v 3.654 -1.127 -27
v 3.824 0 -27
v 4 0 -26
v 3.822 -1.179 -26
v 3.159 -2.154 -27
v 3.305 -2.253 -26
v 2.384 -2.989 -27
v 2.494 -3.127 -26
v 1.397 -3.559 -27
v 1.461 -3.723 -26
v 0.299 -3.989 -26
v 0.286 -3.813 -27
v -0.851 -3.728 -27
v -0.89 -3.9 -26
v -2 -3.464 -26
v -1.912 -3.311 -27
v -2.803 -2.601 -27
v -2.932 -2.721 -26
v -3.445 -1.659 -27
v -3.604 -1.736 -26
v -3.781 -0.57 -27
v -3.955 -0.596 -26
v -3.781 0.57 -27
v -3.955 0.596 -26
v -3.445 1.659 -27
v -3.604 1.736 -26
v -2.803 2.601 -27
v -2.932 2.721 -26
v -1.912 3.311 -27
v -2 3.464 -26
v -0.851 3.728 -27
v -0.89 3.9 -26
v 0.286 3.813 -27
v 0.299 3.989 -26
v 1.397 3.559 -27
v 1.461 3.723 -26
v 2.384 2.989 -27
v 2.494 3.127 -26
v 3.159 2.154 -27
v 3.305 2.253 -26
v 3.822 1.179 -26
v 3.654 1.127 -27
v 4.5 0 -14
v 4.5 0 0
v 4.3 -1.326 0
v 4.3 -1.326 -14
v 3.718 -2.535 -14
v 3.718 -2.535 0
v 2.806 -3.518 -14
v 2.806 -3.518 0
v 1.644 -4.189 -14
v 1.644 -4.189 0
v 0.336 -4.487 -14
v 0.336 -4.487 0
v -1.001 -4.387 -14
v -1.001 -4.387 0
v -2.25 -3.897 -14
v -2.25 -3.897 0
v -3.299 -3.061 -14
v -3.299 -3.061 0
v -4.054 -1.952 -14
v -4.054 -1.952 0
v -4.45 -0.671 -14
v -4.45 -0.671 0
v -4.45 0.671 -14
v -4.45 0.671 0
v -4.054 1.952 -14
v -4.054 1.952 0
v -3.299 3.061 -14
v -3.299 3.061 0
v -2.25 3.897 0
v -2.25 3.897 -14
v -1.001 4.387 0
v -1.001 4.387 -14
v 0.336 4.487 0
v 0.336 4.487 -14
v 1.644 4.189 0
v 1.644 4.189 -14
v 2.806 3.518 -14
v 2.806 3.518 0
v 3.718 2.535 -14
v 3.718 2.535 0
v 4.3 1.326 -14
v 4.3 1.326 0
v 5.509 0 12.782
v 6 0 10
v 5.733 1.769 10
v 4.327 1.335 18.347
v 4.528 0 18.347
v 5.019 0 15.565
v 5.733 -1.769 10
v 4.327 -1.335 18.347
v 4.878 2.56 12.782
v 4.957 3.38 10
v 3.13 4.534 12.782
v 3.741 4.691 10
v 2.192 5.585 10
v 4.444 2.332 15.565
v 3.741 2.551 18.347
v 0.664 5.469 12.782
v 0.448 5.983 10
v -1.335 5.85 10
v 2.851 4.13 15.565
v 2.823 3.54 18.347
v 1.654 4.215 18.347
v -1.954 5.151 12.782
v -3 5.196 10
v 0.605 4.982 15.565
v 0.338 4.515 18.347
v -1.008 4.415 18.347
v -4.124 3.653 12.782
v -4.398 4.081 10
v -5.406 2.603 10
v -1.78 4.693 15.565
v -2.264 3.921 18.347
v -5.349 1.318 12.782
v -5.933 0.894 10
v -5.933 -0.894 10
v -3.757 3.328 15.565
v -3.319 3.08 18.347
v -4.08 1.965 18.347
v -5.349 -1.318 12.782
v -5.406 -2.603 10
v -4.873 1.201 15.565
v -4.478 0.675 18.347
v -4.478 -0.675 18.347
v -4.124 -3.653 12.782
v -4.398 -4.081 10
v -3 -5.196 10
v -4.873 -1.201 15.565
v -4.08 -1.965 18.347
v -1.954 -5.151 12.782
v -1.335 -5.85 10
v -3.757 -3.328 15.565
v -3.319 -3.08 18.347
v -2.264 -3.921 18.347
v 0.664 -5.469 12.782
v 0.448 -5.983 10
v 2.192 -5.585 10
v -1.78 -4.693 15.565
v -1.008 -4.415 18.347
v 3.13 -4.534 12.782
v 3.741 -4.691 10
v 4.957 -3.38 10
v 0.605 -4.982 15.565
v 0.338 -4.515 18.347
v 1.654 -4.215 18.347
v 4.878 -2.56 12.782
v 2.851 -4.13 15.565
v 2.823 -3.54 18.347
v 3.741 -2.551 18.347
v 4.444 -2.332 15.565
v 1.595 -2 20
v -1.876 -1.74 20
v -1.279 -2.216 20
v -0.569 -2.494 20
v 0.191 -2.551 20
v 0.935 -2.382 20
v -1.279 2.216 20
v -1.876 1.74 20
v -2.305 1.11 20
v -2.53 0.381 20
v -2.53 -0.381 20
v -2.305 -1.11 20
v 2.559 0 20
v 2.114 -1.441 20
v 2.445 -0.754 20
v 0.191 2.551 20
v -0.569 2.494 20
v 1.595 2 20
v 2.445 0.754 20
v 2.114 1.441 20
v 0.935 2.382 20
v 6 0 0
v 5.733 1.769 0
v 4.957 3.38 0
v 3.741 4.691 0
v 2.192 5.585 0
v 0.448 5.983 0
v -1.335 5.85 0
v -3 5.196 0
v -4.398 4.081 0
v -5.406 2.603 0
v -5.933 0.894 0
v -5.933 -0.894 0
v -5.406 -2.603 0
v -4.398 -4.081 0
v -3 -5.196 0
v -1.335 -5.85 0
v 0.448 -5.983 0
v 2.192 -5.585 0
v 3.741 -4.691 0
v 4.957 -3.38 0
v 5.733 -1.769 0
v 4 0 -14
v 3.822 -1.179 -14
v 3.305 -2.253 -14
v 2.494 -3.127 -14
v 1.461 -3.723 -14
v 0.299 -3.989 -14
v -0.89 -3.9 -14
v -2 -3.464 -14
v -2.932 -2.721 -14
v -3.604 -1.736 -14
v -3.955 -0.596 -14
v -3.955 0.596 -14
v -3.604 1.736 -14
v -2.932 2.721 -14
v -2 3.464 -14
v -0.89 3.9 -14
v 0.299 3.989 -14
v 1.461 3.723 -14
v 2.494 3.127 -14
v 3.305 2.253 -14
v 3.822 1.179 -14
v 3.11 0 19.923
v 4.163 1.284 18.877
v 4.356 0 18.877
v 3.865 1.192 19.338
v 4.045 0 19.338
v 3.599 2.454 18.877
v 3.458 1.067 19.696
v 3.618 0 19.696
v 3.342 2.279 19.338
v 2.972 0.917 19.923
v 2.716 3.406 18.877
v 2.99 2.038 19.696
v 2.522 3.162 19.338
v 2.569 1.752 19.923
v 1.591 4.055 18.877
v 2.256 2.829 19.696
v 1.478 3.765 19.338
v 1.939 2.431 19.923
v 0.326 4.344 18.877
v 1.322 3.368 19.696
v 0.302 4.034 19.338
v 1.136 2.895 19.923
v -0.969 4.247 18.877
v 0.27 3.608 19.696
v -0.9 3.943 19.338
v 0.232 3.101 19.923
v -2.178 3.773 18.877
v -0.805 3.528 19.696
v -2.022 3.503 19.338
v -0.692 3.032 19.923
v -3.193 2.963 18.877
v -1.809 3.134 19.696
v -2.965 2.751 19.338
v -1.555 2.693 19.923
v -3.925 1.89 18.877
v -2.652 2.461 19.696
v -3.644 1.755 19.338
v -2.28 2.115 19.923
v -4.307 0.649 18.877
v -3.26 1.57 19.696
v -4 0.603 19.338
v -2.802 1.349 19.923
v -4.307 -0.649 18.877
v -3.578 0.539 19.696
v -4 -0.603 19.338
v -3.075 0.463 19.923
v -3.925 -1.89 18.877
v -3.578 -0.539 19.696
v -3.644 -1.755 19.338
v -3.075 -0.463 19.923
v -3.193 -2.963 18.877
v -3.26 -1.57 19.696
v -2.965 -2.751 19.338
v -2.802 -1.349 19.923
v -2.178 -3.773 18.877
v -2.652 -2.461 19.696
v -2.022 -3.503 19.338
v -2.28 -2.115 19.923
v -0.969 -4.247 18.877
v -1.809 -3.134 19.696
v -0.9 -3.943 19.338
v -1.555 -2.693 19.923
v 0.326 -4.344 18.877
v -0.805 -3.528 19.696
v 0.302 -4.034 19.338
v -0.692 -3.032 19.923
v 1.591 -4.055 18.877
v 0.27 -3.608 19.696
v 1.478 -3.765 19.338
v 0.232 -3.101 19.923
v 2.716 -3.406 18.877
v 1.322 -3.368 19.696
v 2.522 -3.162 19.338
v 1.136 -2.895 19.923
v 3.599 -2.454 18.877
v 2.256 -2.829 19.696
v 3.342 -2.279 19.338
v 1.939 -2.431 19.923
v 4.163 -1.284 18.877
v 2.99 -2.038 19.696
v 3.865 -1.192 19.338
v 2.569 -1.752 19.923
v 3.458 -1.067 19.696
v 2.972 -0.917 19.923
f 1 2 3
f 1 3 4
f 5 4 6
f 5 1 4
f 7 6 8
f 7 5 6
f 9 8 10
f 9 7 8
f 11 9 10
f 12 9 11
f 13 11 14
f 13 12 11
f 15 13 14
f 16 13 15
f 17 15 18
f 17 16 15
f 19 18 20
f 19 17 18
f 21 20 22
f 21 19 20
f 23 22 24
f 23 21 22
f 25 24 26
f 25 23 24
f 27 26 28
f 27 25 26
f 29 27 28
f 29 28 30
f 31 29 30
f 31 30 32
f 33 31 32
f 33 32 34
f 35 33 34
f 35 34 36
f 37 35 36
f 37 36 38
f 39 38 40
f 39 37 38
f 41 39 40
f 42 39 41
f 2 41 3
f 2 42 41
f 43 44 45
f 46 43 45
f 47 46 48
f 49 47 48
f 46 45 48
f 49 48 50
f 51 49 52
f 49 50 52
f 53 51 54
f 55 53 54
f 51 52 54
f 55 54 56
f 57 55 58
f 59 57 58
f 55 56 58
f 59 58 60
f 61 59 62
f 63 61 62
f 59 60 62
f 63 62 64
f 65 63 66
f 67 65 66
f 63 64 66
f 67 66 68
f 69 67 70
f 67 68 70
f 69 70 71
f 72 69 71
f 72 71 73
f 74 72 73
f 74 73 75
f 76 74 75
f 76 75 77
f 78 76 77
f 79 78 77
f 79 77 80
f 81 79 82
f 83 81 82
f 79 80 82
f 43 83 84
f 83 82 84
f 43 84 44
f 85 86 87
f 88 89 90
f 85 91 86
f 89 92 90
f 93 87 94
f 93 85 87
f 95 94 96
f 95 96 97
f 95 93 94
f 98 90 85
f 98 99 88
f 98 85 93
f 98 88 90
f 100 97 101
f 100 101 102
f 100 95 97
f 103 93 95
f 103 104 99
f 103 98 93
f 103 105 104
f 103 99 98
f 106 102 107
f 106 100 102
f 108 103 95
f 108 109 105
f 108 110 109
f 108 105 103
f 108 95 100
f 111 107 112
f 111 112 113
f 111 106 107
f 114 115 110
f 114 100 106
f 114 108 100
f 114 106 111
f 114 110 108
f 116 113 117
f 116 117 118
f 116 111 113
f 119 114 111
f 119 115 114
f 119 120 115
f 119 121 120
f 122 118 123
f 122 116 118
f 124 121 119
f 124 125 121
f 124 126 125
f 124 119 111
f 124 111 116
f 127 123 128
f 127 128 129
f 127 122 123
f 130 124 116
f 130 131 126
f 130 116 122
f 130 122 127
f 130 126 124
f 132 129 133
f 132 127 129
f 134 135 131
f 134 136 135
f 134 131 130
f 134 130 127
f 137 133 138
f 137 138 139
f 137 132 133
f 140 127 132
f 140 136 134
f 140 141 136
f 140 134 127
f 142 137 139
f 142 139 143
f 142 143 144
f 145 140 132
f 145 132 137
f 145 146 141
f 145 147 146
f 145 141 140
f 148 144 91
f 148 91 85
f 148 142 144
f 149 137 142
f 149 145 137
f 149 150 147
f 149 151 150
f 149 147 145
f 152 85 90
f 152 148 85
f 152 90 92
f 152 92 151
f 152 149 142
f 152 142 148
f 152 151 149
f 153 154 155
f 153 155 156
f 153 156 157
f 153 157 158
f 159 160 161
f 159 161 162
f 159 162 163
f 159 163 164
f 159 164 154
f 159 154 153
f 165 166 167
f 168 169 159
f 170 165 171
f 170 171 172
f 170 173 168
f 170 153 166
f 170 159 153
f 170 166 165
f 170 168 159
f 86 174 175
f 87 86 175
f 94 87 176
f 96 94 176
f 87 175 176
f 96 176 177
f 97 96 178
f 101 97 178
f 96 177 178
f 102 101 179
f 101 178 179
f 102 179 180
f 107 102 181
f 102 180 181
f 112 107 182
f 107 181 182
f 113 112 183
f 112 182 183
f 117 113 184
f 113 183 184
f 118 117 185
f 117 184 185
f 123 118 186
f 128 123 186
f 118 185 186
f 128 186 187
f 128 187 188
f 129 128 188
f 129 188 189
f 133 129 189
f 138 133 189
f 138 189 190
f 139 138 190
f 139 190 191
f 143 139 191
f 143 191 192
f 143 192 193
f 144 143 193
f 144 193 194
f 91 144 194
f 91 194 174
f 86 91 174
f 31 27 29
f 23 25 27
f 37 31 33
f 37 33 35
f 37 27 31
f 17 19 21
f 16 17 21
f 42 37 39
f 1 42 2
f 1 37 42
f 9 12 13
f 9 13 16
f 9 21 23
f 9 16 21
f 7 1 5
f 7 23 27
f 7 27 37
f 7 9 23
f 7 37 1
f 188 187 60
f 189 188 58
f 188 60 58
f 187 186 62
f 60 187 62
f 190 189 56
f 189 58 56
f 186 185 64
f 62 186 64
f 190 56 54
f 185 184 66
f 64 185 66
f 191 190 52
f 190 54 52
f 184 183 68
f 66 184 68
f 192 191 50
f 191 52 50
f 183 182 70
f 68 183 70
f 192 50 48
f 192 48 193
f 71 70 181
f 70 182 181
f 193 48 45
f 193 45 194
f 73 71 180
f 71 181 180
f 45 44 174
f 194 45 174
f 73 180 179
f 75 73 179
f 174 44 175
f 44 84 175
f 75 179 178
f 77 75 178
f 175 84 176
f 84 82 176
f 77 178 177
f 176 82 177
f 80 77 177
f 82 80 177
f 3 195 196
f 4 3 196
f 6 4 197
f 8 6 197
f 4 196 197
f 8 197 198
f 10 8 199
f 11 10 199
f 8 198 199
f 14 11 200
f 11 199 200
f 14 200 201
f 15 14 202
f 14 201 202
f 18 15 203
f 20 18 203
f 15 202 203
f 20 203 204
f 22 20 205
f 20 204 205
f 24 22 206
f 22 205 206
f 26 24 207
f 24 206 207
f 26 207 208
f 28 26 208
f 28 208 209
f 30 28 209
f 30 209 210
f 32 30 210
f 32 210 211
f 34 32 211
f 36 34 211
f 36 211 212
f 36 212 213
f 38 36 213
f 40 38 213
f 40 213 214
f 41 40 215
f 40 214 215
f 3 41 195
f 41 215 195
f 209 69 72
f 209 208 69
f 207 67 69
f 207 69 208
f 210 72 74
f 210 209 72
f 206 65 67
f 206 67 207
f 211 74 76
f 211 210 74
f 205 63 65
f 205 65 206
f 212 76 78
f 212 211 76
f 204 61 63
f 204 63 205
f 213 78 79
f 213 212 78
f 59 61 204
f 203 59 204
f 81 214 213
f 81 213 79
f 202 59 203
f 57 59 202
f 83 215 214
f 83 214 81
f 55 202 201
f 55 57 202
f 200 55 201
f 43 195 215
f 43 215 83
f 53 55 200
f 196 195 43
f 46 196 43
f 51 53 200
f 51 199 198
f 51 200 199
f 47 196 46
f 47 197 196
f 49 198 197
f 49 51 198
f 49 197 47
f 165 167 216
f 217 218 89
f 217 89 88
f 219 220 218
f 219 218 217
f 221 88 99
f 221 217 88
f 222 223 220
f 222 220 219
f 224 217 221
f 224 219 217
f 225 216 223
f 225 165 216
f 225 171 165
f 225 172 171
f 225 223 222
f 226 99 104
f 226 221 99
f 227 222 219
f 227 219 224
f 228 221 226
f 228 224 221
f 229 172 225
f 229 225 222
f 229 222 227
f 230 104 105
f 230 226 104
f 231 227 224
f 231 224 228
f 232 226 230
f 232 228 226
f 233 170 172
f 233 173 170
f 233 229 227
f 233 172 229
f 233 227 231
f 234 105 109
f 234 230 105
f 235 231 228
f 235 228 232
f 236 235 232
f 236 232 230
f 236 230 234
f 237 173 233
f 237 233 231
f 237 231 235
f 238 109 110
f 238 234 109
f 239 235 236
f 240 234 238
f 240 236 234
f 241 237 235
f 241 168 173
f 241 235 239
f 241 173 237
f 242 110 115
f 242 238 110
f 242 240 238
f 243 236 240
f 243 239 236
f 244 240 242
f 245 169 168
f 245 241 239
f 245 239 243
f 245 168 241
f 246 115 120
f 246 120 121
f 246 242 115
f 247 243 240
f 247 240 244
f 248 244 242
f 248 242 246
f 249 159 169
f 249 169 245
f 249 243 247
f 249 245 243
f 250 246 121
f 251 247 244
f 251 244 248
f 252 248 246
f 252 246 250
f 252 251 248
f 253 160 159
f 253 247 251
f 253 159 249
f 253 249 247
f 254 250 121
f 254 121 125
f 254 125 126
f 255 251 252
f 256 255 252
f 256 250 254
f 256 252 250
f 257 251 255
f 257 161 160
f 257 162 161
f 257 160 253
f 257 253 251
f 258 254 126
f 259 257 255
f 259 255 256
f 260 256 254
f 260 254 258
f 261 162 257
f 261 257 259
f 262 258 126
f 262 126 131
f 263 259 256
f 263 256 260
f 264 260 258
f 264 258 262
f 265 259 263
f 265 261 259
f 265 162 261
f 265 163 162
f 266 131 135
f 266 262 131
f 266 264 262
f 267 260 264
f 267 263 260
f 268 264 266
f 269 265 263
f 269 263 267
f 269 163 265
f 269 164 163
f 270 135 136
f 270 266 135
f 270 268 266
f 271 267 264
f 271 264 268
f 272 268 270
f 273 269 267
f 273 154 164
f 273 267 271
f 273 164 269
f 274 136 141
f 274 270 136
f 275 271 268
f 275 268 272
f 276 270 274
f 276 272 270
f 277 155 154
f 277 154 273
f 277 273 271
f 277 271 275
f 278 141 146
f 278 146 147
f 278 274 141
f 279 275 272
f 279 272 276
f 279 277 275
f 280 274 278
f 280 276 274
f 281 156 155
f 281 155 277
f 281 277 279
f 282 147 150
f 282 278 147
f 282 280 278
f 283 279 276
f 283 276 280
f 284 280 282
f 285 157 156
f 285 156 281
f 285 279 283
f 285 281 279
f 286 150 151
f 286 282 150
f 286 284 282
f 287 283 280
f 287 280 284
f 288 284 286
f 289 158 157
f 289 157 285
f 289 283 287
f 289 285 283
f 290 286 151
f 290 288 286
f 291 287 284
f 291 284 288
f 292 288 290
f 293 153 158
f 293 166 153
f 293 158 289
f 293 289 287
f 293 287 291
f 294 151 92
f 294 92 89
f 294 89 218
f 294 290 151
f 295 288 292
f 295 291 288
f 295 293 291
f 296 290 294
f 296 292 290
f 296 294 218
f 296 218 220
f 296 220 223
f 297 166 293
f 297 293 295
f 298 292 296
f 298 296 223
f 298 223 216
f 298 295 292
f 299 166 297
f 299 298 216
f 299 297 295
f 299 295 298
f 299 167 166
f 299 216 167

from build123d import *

# Parameters (mm, degrees)
CROQUIS1_R              = 6
SALIENTE_EXTRUIR1_DEPTH = 10
CROQUIS2_R              = 6
SALIENTE_EXTRUIR2_DEPTH = 10
CHAFL_N1_SIZE           = 10
CHAFL_N1_SIZE2          = 1.763269807
REDONDEO1_R             = 2
CROQUIS3_R              = 4.5
SALIENTE_EXTRUIR3_DEPTH = 14
CROQUIS4_R              = 4
SALIENTE_EXTRUIR4_DEPTH = 13
CHAFL_N2_SIZE           = 1
CHAFL_N2_SIZE2          = 0.176326981


with BuildPart() as part:
    # Croquis1 → Saliente-Extruir1 (new body)
    with BuildSketch(Plane.XY):
        Circle(CROQUIS1_R)
    extrude(amount=SALIENTE_EXTRUIR1_DEPTH)

    # Croquis2 → Saliente-Extruir2 (add)
    with BuildSketch(Plane.XY.offset(10)):
        Circle(CROQUIS2_R)
    extrude(amount=SALIENTE_EXTRUIR2_DEPTH)

    # Chaflán1
    chafl_n1_edges = [part.edges().sort_by_distance(p)[0] for p in [
        (-6, 0, 20),
    ]]
    chafl_n1_side = [part.faces().sort_by_distance(p)[0] for p in [
        (-6, 0, 10),
    ]]
    chamfer(chafl_n1_edges, length=CHAFL_N1_SIZE, length2=CHAFL_N1_SIZE2, reference=chafl_n1_side[0])

    # Redondeo1
    redondeo1_edges = [part.edges().sort_by_distance(p)[0] for p in [
        (-4.236730193, 0, 20),
    ]]
    fillet(redondeo1_edges, radius=REDONDEO1_R)

    # Croquis3 → Saliente-Extruir3 (add)
    with BuildSketch(Plane(origin=(0, 0, 0), x_dir=(-1, 0, 0), z_dir=(0, 0, -1))):
        with Locations(Location((0, 0, 0), (0, 0, 180))):
            Circle(CROQUIS3_R)
    extrude(amount=SALIENTE_EXTRUIR3_DEPTH)

    # Croquis4 → Saliente-Extruir4 (add)
    with BuildSketch(Plane(origin=(0, 0, -14), x_dir=(-1, 0, 0), z_dir=(0, 0, -1))):
        with Locations(Location((0, 0, 0), (0, 0, 180))):
            Circle(CROQUIS4_R)
    extrude(amount=SALIENTE_EXTRUIR4_DEPTH)

    # Chaflán2
    chafl_n2_edges = [part.edges().sort_by_distance(p)[0] for p in [
        (-4, 0, -27),
    ]]
    chafl_n2_side = [part.faces().sort_by_distance(p)[0] for p in [
        (-4, 0, -20.5),
    ]]
    chamfer(chafl_n2_edges, length=CHAFL_N2_SIZE, length2=CHAFL_N2_SIZE2, reference=chafl_n2_side[0])


solid = part.part
